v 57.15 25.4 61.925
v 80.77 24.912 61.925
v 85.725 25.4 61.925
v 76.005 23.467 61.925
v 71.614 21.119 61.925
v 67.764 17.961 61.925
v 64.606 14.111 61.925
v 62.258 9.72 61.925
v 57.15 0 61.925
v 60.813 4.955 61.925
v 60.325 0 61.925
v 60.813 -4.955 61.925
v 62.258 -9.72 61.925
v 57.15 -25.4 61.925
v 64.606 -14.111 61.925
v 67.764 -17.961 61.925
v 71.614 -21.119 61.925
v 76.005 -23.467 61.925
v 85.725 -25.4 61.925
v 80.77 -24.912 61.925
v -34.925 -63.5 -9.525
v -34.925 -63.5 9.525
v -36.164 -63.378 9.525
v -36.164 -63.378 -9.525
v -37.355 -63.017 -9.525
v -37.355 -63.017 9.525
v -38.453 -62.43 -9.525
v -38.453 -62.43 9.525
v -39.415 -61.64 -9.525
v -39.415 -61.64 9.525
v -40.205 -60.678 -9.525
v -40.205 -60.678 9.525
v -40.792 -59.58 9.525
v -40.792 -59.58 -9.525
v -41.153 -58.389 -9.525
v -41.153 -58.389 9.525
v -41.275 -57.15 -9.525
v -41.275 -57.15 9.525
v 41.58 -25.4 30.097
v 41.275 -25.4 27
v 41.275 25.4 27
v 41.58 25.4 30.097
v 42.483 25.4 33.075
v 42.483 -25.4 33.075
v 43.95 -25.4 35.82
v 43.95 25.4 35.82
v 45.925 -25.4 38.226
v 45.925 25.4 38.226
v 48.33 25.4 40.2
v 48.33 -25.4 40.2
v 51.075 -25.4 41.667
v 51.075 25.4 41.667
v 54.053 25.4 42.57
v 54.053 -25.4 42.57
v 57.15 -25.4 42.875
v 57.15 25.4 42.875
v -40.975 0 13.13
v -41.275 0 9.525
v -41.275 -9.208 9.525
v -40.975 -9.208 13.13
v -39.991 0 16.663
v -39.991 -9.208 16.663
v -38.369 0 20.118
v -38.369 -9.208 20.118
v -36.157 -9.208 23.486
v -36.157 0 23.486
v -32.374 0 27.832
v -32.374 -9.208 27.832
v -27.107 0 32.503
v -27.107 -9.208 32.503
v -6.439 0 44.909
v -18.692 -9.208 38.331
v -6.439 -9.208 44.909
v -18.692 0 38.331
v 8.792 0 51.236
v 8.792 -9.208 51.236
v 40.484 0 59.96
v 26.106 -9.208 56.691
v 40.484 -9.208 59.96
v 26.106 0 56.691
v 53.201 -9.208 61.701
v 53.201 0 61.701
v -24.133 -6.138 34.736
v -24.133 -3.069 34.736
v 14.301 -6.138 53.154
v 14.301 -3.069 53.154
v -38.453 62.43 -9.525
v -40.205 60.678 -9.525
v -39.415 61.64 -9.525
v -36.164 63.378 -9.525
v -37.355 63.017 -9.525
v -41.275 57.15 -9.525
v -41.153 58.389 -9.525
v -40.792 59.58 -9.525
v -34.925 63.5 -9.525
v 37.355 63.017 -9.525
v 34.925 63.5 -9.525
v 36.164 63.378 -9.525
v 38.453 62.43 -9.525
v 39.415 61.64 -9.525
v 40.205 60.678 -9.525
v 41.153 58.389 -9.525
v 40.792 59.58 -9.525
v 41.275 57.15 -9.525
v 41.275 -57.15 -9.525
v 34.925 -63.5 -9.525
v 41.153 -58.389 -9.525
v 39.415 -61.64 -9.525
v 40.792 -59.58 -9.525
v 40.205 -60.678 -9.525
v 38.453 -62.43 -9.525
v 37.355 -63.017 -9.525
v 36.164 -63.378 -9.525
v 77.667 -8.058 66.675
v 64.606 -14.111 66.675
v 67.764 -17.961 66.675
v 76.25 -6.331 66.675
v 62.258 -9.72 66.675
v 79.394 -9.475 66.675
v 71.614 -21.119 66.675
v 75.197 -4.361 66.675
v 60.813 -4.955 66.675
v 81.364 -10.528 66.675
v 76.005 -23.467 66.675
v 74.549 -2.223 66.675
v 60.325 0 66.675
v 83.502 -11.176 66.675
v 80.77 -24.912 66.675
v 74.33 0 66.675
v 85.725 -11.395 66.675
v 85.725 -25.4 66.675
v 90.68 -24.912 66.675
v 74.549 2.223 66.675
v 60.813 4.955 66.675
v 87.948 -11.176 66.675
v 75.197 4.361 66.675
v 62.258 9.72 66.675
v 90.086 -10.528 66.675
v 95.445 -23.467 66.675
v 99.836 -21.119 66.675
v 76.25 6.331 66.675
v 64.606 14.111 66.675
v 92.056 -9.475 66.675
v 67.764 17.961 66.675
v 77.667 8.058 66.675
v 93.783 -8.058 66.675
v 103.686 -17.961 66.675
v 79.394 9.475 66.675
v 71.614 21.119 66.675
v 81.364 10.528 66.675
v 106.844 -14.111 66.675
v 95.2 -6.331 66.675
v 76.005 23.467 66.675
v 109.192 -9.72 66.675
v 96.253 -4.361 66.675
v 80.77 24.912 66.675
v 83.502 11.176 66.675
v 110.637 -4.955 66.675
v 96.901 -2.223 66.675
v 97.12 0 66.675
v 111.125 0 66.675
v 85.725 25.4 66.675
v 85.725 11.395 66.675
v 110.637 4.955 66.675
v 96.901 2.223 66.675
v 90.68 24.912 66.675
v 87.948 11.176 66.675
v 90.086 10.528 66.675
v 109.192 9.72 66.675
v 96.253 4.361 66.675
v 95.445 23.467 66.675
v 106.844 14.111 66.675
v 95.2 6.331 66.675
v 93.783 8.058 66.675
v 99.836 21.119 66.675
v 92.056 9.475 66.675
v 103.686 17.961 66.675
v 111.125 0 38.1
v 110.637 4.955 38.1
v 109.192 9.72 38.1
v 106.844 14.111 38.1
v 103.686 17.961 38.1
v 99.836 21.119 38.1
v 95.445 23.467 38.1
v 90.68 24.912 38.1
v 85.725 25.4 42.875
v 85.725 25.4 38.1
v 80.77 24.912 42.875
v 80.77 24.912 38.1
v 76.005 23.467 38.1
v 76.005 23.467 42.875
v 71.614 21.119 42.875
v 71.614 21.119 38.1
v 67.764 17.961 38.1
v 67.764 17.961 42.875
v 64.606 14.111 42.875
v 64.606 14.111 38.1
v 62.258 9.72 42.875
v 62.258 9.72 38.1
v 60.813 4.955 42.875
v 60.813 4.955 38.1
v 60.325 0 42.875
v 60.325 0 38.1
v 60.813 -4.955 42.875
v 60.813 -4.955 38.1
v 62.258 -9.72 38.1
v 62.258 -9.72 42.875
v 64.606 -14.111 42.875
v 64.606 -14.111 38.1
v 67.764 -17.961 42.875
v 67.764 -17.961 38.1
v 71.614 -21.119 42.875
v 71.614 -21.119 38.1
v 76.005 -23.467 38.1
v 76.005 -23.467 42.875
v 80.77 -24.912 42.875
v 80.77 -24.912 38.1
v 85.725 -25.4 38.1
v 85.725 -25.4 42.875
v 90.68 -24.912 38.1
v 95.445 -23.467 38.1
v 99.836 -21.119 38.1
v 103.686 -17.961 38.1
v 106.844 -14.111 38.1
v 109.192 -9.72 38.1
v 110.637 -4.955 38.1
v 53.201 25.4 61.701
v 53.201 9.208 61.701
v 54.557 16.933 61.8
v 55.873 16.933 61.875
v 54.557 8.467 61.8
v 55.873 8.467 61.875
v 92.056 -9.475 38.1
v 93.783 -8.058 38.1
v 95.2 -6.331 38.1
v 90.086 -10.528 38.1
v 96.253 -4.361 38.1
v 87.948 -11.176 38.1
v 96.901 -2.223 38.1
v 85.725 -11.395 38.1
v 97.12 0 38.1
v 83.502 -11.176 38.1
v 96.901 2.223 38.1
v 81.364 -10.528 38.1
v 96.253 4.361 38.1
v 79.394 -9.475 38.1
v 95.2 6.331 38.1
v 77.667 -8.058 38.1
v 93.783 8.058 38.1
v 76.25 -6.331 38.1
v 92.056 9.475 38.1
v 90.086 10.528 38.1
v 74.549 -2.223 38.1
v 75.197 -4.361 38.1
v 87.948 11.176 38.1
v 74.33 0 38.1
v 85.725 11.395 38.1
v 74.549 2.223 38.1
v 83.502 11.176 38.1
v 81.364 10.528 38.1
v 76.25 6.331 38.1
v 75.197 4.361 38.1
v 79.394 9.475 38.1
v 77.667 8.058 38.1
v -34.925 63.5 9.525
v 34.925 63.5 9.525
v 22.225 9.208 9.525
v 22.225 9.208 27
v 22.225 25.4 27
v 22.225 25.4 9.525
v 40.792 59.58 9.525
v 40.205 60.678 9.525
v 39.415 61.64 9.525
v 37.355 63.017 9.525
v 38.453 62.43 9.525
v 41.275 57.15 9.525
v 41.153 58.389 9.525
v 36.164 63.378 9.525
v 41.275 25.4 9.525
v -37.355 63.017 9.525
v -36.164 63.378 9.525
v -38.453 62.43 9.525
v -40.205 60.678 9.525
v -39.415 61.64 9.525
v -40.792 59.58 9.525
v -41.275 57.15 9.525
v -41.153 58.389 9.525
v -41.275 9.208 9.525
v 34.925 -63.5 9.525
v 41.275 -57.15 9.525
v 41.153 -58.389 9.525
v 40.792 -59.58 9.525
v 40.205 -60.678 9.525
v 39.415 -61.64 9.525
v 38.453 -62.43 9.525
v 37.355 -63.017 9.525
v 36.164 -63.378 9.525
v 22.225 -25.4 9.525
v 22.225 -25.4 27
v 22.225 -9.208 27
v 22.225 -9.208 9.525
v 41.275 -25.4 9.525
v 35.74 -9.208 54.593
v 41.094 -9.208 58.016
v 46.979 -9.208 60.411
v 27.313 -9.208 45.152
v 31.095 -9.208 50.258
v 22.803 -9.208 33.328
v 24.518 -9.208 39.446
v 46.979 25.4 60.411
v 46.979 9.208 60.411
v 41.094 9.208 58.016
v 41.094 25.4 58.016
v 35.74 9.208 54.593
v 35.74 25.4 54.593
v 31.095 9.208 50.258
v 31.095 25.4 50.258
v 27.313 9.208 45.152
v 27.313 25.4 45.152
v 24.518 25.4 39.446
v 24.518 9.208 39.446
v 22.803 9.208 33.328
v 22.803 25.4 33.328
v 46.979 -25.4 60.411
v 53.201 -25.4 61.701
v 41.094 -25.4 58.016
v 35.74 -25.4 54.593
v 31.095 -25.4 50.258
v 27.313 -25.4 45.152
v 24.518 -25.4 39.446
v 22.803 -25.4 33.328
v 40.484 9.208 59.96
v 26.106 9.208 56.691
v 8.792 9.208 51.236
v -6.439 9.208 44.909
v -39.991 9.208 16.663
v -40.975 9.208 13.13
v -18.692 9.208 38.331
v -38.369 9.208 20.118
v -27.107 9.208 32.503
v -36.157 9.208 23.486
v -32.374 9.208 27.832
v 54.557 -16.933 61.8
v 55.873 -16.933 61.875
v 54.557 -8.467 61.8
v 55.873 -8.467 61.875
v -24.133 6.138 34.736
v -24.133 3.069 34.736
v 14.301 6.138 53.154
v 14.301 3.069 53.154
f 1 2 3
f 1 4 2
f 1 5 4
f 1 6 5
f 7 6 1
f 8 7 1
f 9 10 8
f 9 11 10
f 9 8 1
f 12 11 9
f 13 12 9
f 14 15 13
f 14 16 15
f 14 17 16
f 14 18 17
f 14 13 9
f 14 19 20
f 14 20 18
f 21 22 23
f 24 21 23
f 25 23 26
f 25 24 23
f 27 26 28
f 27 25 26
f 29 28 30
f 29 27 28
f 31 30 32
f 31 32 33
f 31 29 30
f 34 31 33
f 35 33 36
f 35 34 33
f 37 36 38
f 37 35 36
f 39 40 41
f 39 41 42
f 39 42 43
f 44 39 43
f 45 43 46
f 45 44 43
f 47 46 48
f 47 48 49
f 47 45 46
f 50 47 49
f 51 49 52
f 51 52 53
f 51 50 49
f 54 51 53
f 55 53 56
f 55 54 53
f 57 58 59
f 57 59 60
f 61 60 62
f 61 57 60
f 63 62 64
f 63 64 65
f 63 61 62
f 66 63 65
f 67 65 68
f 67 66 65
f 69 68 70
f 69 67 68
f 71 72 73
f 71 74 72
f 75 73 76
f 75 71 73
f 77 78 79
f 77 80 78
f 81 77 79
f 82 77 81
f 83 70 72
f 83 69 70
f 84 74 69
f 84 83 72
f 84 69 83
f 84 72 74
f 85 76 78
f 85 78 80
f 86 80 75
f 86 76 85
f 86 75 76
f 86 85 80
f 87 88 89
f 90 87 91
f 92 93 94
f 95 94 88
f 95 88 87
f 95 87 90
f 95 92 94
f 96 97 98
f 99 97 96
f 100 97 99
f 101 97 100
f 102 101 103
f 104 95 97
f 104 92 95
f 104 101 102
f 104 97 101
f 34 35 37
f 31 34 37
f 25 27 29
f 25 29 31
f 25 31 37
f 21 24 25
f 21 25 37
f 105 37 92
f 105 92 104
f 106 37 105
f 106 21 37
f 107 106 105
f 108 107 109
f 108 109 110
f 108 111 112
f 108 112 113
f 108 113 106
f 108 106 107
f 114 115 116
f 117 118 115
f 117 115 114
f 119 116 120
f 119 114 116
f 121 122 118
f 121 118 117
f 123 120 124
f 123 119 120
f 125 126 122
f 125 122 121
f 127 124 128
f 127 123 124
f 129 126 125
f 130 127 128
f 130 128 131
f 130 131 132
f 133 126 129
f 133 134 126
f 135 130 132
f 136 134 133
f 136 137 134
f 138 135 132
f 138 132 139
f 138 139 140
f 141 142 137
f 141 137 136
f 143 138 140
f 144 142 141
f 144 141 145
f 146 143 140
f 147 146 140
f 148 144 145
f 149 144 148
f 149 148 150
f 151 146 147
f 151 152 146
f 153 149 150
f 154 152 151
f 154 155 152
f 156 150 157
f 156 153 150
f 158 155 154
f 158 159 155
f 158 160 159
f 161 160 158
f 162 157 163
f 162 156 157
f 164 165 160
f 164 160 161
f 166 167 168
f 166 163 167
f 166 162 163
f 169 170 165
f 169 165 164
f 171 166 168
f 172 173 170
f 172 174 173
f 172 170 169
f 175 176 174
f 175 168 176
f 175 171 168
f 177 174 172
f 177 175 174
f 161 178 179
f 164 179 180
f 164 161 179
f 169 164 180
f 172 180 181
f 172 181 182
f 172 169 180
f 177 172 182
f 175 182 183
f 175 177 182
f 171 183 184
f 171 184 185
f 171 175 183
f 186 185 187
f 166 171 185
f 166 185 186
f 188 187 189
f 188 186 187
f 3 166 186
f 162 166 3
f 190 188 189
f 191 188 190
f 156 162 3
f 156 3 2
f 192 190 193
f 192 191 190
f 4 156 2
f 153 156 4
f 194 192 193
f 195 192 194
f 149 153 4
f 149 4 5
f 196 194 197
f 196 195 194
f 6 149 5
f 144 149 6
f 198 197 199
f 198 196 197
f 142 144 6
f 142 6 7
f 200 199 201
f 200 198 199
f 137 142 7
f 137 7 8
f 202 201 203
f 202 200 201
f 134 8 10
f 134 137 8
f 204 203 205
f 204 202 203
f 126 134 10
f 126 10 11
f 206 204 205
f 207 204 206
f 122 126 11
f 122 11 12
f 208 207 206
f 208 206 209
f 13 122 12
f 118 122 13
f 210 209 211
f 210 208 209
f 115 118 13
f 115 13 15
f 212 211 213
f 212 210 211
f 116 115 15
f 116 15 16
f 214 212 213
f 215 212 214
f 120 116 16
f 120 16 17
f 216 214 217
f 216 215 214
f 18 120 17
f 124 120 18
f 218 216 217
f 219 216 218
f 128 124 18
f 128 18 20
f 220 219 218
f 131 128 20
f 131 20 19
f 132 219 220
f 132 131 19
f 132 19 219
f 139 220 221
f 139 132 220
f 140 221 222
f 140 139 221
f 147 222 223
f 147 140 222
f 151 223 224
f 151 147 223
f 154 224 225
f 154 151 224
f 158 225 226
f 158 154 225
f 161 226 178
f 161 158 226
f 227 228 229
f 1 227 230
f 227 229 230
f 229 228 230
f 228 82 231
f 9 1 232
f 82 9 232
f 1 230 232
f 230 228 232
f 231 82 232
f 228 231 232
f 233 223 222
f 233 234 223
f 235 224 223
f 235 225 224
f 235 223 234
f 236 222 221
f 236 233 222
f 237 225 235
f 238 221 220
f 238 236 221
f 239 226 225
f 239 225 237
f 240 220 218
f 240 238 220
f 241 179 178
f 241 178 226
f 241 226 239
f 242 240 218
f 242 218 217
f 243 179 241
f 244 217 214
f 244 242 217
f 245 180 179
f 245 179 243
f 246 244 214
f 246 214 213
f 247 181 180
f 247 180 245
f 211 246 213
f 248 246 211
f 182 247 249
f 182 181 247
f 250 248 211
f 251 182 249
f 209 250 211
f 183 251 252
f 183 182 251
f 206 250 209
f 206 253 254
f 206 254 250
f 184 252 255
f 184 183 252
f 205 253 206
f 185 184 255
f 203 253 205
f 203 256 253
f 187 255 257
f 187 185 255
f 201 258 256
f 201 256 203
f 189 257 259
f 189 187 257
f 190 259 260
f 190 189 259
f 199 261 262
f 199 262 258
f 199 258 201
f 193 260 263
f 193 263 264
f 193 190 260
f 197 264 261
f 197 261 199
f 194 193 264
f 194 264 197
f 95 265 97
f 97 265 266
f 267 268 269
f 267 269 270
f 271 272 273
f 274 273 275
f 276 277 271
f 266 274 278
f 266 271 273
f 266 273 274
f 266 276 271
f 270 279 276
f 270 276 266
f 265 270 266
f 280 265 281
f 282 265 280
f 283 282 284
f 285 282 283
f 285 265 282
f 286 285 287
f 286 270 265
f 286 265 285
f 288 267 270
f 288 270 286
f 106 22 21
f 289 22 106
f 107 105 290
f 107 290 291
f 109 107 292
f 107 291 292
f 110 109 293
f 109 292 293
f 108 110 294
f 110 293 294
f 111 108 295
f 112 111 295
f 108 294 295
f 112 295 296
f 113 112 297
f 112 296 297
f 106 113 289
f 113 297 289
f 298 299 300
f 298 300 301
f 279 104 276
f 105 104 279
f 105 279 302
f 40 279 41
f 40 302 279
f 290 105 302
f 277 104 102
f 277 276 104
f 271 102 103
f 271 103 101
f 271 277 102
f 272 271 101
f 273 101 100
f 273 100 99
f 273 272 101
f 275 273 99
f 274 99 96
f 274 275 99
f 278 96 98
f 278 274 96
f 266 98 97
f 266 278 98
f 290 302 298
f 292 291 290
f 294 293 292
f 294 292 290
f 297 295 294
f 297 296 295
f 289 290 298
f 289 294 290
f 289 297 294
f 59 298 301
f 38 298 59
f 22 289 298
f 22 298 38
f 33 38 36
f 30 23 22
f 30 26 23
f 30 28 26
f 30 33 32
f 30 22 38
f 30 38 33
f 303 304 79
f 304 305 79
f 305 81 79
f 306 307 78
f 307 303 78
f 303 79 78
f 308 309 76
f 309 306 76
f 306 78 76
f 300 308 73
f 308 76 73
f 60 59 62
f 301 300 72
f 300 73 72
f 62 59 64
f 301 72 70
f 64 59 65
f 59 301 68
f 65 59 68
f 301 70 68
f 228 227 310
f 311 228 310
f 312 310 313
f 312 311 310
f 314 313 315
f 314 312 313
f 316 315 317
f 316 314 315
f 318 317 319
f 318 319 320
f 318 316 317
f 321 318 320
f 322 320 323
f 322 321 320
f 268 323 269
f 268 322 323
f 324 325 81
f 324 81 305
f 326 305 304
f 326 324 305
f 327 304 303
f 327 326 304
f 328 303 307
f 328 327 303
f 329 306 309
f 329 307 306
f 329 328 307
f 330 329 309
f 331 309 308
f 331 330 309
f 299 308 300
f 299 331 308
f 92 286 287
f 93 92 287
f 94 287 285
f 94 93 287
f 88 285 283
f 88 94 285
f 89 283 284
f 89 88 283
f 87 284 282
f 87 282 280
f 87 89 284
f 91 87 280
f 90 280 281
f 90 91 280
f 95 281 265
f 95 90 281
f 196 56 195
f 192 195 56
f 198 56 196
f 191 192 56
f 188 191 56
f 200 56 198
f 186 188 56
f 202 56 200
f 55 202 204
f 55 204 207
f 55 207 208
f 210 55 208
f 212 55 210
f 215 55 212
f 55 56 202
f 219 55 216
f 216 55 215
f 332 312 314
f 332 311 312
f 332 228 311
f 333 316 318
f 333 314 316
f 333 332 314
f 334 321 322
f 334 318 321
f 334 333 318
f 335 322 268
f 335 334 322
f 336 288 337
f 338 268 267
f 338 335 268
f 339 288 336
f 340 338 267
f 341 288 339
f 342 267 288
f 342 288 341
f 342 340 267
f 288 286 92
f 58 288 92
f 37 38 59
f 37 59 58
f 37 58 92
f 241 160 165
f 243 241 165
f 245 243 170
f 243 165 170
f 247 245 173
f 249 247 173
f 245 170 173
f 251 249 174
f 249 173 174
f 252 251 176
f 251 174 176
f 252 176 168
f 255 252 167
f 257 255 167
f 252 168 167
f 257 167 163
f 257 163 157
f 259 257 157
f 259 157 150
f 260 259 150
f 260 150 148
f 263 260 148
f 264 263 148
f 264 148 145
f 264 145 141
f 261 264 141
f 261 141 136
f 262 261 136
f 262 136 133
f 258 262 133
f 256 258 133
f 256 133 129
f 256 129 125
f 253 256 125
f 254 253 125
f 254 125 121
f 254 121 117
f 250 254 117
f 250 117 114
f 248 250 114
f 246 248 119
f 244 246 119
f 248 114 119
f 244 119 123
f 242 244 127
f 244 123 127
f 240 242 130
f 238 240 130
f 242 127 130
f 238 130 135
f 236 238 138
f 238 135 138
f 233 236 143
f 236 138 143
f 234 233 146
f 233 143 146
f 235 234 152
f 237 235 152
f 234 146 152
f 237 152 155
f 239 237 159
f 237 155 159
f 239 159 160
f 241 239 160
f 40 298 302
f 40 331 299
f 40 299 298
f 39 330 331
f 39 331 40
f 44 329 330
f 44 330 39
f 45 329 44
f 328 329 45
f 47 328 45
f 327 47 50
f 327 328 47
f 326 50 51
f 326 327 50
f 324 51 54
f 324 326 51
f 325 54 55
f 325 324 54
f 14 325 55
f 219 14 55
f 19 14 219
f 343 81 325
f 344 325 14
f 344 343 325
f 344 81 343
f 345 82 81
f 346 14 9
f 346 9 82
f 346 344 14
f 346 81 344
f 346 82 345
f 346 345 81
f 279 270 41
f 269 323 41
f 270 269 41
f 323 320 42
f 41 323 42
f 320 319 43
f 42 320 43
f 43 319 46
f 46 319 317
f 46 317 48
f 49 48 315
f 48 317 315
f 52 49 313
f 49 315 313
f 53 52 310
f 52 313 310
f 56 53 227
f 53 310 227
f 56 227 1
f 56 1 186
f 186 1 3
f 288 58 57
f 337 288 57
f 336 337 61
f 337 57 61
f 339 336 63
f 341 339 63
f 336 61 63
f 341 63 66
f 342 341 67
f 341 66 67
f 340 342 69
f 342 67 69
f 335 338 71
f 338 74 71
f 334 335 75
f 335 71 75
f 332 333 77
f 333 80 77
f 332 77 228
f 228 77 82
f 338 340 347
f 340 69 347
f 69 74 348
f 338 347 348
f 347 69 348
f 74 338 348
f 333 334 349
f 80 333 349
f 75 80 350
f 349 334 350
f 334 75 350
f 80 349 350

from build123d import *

# Parameters (mm, degrees)
F1_DEPTH = 63.5
F0_W     = 25.4
F0_H     = 19.05
F2_DEPTH = 25.4
F3_DEPTH = 9.2075
F5_R     = 6.35
F6_R     = 11.3954507036
F7_DEPTH = 76.201


with BuildPart() as f1:
    # F0 (on Front) → F1 (new body, symmetric)
    with BuildSketch(Plane.XZ):
        Polygon((-41.275, 9.525), (-41.275, -9.525), (41.275, -9.525), (41.275, 9.525), (22.225, 9.525), align=None)
    extrude(amount=F1_DEPTH, both=True)

    # F0 (on Front) → F2 (join, symmetric)
    with BuildSketch(Plane.XZ):
        with BuildLine():
            Line((22.225, 9.525), (41.275, 9.525))
            Line((41.275, 9.525), (41.275, 27.0002))
            ThreePointArc((41.275, 27.0002), (45.9246798487, 38.2255201513), (57.15, 42.8752))
            Line((57.15, 42.8752), (60.325, 42.8752))
            Line((60.325, 42.8752), (60.325, 61.9252))
            Line((60.325, 61.9252), (57.15, 61.9252))
            add(Edge.make_bspline(
                [(53.2009990256, 61.7012232746), (54.5754497046, 61.8116519501), (55.8942153415, 61.886670259), (57.15, 61.9252)],
                knots=[106.938445779, 106.938445779, 106.938445779, 106.938445779, 111.5045361635, 111.5045361635, 111.5045361635, 111.5045361635], degree=3))
            ThreePointArc((53.2009990256, 61.7012232746), (31.0954947847, 50.2578521383), (22.225, 27.0002))
            Line((22.225, 27.0002), (22.225, 9.525))
        make_face()
        with Locations((73.025, 52.4002)):
            Rectangle(F0_W, F0_H)
    extrude(amount=F2_DEPTH, both=True)

    # F0 (on Front) → F3 (join, symmetric)
    with BuildSketch(Plane.XZ):
        with BuildLine():
            add(Edge.make_bspline(
                [(-41.275, 9.525), (-41.7220303949, 37.1060348211), (21.011180815, 59.1149689658), (53.2009990256, 61.7012232746)],
                knots=[0, 0, 0, 0, 106.938445779, 106.938445779, 106.938445779, 106.938445779], degree=3))
            Line((-41.275, 9.525), (22.225, 9.525))
            Line((22.225, 9.525), (22.225, 27.0002))
            ThreePointArc((22.225, 27.0002), (31.0954947847, 50.2578521383), (53.2009990256, 61.7012232746))
        make_face()
    extrude(amount=F3_DEPTH, both=True)

    # F0 (on Front) → F4 (revolve)
    with BuildSketch(Plane.XZ):
        Polygon((85.725, 66.675), (85.725, 61.9252), (85.725, 42.8752), (85.725, 38.1), (111.125, 38.1), (111.125, 66.675), align=None)
    revolve(axis=Axis((85.725, 0, 52.3875), (0, 0, 1)))

    # F5
    f5_edges = [f1.edges().sort_by_distance(p)[0] for p in [
        (41.275, -63.5, 0),
        (-41.275, -63.5, 0),
        (-41.275, 63.5, 0),
        (41.275, 63.5, 0),
    ]]
    fillet(f5_edges, radius=F5_R)

    # F6 (on face) → F7 (cut, through all)
    with BuildSketch(Plane.XY.offset(66.675)):
        with Locations((85.725, 0)):
            Circle(F6_R)
    extrude(amount=-F7_DEPTH, mode=Mode.SUBTRACT)


solid = f1.part
